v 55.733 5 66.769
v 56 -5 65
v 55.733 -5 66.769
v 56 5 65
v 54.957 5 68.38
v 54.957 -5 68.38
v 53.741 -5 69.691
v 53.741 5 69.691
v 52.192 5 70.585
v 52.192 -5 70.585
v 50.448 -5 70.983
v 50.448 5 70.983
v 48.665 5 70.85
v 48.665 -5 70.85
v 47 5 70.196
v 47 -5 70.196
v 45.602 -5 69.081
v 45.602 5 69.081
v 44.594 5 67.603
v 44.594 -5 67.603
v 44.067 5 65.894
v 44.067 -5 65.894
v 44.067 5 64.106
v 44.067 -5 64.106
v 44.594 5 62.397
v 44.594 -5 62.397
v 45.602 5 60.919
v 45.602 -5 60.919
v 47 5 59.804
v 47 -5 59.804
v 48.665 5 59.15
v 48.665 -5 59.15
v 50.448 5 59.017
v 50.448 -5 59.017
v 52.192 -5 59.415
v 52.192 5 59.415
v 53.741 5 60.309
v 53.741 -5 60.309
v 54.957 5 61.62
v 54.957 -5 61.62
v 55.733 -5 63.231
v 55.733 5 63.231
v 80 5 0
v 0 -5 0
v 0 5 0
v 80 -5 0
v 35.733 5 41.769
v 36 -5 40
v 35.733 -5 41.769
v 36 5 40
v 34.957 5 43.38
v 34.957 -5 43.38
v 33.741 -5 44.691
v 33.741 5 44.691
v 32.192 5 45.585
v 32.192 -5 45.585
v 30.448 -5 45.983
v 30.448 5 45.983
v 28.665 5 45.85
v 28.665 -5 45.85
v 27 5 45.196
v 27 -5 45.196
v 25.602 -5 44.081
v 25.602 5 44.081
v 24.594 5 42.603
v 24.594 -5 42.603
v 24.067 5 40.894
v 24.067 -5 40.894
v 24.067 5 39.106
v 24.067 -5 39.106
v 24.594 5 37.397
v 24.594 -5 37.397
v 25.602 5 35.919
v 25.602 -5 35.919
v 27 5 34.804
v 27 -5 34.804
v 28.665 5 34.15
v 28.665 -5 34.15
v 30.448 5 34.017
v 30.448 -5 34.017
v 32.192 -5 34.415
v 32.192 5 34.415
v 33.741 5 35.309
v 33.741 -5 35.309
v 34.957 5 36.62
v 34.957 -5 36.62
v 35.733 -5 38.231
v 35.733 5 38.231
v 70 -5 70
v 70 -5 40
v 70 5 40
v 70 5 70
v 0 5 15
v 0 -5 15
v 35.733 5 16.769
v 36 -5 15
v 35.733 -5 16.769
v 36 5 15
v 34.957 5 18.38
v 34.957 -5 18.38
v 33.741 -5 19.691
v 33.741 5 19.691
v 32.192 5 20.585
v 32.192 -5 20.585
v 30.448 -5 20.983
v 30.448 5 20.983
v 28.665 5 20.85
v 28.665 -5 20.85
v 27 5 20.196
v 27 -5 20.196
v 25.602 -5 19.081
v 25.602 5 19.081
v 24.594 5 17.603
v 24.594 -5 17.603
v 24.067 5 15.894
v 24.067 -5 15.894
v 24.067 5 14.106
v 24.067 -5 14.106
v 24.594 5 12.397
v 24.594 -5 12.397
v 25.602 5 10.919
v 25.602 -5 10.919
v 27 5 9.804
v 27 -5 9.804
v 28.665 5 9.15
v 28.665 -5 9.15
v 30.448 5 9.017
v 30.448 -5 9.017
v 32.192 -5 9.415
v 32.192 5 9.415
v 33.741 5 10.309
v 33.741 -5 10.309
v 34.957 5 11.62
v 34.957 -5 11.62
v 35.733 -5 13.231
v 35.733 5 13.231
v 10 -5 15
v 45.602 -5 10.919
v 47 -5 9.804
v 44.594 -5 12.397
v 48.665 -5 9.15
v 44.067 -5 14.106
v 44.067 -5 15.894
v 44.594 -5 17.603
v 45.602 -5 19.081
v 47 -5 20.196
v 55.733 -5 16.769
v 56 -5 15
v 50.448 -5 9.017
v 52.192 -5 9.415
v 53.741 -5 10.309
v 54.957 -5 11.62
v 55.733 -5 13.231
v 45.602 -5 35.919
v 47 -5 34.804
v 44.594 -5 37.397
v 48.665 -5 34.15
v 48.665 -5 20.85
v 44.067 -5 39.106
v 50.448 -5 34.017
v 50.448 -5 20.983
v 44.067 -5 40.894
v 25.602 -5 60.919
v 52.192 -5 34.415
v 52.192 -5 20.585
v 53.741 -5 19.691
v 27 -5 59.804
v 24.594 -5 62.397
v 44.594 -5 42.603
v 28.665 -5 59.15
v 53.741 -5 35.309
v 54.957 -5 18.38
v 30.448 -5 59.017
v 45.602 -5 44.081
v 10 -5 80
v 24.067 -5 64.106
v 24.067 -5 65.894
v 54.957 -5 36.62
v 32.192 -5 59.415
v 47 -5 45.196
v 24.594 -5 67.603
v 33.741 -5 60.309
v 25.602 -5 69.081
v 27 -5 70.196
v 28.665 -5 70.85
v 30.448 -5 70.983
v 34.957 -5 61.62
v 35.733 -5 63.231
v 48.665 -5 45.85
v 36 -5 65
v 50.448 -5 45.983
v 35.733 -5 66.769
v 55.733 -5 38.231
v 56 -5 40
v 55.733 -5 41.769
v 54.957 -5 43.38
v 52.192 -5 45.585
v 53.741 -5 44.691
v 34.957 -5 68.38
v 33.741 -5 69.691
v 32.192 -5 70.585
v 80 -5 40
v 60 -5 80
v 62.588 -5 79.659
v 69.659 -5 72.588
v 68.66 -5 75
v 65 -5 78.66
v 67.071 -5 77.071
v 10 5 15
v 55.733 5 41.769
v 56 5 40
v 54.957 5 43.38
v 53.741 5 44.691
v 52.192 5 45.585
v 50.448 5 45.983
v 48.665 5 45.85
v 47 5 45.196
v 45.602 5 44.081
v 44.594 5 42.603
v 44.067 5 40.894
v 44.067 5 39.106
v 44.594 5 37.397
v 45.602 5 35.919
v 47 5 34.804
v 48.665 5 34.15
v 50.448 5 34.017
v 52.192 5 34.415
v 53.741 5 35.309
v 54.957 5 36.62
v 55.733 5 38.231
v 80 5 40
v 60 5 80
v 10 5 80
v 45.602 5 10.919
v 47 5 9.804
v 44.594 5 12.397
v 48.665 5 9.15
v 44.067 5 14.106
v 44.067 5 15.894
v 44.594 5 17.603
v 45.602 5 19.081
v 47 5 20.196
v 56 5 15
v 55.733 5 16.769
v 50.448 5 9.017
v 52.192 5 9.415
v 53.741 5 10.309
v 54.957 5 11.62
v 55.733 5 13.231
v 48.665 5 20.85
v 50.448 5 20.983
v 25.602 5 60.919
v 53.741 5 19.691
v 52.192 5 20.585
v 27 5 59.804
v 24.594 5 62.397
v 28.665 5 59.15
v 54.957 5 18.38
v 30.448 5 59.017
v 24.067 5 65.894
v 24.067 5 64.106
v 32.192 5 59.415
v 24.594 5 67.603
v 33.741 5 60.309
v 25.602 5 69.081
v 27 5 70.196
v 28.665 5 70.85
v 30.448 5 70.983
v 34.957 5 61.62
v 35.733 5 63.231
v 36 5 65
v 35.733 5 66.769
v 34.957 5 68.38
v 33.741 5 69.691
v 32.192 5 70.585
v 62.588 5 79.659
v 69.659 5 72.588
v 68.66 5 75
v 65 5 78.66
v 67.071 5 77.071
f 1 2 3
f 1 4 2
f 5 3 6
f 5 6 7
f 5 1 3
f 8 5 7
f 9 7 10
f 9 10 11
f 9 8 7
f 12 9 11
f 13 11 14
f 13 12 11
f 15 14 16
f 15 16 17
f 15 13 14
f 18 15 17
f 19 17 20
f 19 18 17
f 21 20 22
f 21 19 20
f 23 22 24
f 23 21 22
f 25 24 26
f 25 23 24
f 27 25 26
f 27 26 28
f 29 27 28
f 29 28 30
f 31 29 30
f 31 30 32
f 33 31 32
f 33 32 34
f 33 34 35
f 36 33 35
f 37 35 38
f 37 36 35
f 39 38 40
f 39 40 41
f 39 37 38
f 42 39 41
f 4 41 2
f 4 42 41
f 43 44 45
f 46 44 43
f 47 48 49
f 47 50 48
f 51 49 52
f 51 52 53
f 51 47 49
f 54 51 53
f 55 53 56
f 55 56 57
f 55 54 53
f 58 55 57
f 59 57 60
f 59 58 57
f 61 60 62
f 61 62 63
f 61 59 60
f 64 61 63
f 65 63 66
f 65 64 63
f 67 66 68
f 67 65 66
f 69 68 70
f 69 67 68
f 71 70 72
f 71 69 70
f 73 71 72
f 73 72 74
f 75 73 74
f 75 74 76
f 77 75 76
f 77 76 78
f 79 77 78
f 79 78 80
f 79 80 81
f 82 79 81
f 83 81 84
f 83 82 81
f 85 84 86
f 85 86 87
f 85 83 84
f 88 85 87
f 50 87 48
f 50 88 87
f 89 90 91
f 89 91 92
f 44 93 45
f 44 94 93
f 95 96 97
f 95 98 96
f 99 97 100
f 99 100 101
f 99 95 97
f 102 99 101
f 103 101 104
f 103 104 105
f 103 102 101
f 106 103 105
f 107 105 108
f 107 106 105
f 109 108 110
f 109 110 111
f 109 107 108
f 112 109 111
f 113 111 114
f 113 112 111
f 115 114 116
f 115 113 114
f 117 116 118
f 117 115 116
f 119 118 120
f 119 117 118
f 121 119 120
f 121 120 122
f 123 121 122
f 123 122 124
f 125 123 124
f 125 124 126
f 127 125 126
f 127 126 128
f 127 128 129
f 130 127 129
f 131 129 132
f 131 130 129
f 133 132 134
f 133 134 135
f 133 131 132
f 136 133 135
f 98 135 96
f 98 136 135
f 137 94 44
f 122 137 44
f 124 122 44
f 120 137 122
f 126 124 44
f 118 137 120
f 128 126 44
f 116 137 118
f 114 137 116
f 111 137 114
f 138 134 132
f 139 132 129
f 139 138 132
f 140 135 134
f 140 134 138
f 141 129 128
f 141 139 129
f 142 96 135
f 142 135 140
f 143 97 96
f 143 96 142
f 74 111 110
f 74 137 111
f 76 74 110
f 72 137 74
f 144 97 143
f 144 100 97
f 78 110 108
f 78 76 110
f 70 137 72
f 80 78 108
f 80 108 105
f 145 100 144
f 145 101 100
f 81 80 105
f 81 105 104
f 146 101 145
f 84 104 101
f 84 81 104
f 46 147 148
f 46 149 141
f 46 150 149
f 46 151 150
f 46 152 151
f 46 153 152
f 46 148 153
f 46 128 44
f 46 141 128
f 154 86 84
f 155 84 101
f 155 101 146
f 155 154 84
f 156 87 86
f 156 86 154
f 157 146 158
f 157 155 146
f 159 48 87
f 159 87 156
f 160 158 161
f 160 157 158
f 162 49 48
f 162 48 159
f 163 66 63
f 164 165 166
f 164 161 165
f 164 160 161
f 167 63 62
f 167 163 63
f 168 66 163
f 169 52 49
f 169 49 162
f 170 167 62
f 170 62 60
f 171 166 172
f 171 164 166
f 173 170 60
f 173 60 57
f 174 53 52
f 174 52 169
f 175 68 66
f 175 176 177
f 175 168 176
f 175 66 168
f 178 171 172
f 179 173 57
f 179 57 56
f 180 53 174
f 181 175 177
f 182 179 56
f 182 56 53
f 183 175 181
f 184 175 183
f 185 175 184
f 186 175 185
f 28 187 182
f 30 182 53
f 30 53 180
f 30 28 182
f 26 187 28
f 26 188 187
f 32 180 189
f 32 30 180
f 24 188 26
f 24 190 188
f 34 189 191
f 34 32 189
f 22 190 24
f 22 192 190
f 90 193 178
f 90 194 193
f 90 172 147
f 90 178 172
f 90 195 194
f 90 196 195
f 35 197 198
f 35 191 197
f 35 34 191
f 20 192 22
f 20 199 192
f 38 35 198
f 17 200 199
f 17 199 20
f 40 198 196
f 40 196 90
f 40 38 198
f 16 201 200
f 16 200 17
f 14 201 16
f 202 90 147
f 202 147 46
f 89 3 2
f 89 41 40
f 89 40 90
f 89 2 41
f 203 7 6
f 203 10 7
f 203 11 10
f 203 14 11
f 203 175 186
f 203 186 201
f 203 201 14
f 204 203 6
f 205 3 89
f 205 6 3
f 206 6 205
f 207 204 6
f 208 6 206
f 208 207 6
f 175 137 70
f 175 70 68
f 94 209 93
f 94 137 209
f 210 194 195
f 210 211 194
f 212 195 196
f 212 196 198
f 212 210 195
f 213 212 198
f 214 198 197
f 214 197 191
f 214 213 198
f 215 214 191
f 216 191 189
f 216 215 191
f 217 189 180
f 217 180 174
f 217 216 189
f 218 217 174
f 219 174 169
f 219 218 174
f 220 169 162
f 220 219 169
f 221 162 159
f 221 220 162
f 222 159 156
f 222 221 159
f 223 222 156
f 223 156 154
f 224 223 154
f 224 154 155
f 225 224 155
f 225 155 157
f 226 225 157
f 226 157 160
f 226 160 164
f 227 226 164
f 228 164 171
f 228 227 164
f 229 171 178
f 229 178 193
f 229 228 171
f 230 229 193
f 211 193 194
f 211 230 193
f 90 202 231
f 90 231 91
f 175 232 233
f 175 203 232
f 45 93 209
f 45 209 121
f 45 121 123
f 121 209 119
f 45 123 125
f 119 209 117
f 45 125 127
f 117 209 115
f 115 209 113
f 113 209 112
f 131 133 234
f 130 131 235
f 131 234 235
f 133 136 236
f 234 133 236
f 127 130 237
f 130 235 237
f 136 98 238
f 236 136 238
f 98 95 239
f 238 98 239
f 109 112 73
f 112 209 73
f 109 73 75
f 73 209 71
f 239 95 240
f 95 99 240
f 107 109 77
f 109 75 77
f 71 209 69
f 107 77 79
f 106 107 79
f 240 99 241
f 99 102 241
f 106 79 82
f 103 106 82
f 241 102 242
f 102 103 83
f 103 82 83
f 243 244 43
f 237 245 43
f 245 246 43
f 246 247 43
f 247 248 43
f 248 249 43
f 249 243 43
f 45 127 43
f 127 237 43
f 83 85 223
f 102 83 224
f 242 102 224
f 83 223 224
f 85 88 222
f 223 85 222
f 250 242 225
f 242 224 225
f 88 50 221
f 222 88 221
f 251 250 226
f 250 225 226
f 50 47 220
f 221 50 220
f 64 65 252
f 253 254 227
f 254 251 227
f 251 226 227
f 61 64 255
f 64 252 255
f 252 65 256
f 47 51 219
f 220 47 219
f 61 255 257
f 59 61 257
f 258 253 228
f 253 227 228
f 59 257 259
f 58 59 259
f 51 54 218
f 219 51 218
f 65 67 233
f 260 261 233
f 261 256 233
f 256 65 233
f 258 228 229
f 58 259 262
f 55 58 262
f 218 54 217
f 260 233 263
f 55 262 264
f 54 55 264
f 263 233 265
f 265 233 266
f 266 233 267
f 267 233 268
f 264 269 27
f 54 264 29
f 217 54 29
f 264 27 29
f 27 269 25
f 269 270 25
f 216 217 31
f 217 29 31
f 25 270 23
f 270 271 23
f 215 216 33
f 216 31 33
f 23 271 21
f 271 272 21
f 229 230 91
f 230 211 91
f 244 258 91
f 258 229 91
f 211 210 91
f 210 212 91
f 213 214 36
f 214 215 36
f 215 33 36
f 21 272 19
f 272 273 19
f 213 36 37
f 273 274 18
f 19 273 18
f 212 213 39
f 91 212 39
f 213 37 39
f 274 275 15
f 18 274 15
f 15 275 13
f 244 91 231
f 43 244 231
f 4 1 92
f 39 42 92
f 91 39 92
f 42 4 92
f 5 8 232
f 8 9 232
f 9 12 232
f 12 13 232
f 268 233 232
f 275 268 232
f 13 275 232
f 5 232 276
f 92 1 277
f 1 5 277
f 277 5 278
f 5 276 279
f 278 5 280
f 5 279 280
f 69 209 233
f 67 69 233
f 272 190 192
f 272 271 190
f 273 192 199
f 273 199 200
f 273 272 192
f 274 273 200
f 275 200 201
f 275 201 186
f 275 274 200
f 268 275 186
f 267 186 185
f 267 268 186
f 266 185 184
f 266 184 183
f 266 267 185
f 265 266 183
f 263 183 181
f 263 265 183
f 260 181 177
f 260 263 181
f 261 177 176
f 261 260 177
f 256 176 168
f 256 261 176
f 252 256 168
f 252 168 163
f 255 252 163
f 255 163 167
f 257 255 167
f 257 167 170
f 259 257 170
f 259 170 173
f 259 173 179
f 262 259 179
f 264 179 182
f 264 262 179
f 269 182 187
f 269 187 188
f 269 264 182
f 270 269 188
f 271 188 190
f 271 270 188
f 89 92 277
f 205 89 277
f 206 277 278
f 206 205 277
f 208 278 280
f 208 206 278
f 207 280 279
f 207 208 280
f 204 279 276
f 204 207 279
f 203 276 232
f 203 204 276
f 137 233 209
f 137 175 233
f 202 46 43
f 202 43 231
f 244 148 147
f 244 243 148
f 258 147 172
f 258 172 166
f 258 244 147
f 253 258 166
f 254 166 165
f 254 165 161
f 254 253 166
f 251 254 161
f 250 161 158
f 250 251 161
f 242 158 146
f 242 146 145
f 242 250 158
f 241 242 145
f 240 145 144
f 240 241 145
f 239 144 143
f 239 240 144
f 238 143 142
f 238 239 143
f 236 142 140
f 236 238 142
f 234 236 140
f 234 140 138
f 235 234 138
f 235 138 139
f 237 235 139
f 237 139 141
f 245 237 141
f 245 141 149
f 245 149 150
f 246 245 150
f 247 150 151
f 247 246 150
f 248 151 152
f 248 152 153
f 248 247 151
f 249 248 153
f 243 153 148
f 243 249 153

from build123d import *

# Parameters (mm, degrees)
F0_R     = 6
F1_DEPTH = 5


with BuildPart() as f1:
    # F0 (on Front) → F1 (new body, symmetric)
    with BuildSketch(Plane.XZ):
        with BuildLine():
            Line((0, 15), (0, 0))
            Line((0, 0), (80, 0))
            Line((80, 0), (80, 40))
            Line((80, 40), (70, 40))
            Line((70, 40), (70, 70))
            ThreePointArc((70, 70), (67.071068, 77.071068), (60, 80))
            Line((60, 80), (10, 80))
            Line((10, 80), (10, 15))
            Line((10, 15), (0, 15))
        make_face()
        with Locations((30, 15)):
            Circle(F0_R, mode=Mode.SUBTRACT)
        with Locations((50, 15)):
            Circle(F0_R, mode=Mode.SUBTRACT)
        with Locations((30, 40)):
            Circle(F0_R, mode=Mode.SUBTRACT)
        with Locations((30, 65)):
            Circle(F0_R, mode=Mode.SUBTRACT)
        with Locations((50, 40)):
            Circle(F0_R, mode=Mode.SUBTRACT)
        with Locations((50, 65)):
            Circle(F0_R, mode=Mode.SUBTRACT)
    extrude(amount=F1_DEPTH, both=True)


solid = f1.part
